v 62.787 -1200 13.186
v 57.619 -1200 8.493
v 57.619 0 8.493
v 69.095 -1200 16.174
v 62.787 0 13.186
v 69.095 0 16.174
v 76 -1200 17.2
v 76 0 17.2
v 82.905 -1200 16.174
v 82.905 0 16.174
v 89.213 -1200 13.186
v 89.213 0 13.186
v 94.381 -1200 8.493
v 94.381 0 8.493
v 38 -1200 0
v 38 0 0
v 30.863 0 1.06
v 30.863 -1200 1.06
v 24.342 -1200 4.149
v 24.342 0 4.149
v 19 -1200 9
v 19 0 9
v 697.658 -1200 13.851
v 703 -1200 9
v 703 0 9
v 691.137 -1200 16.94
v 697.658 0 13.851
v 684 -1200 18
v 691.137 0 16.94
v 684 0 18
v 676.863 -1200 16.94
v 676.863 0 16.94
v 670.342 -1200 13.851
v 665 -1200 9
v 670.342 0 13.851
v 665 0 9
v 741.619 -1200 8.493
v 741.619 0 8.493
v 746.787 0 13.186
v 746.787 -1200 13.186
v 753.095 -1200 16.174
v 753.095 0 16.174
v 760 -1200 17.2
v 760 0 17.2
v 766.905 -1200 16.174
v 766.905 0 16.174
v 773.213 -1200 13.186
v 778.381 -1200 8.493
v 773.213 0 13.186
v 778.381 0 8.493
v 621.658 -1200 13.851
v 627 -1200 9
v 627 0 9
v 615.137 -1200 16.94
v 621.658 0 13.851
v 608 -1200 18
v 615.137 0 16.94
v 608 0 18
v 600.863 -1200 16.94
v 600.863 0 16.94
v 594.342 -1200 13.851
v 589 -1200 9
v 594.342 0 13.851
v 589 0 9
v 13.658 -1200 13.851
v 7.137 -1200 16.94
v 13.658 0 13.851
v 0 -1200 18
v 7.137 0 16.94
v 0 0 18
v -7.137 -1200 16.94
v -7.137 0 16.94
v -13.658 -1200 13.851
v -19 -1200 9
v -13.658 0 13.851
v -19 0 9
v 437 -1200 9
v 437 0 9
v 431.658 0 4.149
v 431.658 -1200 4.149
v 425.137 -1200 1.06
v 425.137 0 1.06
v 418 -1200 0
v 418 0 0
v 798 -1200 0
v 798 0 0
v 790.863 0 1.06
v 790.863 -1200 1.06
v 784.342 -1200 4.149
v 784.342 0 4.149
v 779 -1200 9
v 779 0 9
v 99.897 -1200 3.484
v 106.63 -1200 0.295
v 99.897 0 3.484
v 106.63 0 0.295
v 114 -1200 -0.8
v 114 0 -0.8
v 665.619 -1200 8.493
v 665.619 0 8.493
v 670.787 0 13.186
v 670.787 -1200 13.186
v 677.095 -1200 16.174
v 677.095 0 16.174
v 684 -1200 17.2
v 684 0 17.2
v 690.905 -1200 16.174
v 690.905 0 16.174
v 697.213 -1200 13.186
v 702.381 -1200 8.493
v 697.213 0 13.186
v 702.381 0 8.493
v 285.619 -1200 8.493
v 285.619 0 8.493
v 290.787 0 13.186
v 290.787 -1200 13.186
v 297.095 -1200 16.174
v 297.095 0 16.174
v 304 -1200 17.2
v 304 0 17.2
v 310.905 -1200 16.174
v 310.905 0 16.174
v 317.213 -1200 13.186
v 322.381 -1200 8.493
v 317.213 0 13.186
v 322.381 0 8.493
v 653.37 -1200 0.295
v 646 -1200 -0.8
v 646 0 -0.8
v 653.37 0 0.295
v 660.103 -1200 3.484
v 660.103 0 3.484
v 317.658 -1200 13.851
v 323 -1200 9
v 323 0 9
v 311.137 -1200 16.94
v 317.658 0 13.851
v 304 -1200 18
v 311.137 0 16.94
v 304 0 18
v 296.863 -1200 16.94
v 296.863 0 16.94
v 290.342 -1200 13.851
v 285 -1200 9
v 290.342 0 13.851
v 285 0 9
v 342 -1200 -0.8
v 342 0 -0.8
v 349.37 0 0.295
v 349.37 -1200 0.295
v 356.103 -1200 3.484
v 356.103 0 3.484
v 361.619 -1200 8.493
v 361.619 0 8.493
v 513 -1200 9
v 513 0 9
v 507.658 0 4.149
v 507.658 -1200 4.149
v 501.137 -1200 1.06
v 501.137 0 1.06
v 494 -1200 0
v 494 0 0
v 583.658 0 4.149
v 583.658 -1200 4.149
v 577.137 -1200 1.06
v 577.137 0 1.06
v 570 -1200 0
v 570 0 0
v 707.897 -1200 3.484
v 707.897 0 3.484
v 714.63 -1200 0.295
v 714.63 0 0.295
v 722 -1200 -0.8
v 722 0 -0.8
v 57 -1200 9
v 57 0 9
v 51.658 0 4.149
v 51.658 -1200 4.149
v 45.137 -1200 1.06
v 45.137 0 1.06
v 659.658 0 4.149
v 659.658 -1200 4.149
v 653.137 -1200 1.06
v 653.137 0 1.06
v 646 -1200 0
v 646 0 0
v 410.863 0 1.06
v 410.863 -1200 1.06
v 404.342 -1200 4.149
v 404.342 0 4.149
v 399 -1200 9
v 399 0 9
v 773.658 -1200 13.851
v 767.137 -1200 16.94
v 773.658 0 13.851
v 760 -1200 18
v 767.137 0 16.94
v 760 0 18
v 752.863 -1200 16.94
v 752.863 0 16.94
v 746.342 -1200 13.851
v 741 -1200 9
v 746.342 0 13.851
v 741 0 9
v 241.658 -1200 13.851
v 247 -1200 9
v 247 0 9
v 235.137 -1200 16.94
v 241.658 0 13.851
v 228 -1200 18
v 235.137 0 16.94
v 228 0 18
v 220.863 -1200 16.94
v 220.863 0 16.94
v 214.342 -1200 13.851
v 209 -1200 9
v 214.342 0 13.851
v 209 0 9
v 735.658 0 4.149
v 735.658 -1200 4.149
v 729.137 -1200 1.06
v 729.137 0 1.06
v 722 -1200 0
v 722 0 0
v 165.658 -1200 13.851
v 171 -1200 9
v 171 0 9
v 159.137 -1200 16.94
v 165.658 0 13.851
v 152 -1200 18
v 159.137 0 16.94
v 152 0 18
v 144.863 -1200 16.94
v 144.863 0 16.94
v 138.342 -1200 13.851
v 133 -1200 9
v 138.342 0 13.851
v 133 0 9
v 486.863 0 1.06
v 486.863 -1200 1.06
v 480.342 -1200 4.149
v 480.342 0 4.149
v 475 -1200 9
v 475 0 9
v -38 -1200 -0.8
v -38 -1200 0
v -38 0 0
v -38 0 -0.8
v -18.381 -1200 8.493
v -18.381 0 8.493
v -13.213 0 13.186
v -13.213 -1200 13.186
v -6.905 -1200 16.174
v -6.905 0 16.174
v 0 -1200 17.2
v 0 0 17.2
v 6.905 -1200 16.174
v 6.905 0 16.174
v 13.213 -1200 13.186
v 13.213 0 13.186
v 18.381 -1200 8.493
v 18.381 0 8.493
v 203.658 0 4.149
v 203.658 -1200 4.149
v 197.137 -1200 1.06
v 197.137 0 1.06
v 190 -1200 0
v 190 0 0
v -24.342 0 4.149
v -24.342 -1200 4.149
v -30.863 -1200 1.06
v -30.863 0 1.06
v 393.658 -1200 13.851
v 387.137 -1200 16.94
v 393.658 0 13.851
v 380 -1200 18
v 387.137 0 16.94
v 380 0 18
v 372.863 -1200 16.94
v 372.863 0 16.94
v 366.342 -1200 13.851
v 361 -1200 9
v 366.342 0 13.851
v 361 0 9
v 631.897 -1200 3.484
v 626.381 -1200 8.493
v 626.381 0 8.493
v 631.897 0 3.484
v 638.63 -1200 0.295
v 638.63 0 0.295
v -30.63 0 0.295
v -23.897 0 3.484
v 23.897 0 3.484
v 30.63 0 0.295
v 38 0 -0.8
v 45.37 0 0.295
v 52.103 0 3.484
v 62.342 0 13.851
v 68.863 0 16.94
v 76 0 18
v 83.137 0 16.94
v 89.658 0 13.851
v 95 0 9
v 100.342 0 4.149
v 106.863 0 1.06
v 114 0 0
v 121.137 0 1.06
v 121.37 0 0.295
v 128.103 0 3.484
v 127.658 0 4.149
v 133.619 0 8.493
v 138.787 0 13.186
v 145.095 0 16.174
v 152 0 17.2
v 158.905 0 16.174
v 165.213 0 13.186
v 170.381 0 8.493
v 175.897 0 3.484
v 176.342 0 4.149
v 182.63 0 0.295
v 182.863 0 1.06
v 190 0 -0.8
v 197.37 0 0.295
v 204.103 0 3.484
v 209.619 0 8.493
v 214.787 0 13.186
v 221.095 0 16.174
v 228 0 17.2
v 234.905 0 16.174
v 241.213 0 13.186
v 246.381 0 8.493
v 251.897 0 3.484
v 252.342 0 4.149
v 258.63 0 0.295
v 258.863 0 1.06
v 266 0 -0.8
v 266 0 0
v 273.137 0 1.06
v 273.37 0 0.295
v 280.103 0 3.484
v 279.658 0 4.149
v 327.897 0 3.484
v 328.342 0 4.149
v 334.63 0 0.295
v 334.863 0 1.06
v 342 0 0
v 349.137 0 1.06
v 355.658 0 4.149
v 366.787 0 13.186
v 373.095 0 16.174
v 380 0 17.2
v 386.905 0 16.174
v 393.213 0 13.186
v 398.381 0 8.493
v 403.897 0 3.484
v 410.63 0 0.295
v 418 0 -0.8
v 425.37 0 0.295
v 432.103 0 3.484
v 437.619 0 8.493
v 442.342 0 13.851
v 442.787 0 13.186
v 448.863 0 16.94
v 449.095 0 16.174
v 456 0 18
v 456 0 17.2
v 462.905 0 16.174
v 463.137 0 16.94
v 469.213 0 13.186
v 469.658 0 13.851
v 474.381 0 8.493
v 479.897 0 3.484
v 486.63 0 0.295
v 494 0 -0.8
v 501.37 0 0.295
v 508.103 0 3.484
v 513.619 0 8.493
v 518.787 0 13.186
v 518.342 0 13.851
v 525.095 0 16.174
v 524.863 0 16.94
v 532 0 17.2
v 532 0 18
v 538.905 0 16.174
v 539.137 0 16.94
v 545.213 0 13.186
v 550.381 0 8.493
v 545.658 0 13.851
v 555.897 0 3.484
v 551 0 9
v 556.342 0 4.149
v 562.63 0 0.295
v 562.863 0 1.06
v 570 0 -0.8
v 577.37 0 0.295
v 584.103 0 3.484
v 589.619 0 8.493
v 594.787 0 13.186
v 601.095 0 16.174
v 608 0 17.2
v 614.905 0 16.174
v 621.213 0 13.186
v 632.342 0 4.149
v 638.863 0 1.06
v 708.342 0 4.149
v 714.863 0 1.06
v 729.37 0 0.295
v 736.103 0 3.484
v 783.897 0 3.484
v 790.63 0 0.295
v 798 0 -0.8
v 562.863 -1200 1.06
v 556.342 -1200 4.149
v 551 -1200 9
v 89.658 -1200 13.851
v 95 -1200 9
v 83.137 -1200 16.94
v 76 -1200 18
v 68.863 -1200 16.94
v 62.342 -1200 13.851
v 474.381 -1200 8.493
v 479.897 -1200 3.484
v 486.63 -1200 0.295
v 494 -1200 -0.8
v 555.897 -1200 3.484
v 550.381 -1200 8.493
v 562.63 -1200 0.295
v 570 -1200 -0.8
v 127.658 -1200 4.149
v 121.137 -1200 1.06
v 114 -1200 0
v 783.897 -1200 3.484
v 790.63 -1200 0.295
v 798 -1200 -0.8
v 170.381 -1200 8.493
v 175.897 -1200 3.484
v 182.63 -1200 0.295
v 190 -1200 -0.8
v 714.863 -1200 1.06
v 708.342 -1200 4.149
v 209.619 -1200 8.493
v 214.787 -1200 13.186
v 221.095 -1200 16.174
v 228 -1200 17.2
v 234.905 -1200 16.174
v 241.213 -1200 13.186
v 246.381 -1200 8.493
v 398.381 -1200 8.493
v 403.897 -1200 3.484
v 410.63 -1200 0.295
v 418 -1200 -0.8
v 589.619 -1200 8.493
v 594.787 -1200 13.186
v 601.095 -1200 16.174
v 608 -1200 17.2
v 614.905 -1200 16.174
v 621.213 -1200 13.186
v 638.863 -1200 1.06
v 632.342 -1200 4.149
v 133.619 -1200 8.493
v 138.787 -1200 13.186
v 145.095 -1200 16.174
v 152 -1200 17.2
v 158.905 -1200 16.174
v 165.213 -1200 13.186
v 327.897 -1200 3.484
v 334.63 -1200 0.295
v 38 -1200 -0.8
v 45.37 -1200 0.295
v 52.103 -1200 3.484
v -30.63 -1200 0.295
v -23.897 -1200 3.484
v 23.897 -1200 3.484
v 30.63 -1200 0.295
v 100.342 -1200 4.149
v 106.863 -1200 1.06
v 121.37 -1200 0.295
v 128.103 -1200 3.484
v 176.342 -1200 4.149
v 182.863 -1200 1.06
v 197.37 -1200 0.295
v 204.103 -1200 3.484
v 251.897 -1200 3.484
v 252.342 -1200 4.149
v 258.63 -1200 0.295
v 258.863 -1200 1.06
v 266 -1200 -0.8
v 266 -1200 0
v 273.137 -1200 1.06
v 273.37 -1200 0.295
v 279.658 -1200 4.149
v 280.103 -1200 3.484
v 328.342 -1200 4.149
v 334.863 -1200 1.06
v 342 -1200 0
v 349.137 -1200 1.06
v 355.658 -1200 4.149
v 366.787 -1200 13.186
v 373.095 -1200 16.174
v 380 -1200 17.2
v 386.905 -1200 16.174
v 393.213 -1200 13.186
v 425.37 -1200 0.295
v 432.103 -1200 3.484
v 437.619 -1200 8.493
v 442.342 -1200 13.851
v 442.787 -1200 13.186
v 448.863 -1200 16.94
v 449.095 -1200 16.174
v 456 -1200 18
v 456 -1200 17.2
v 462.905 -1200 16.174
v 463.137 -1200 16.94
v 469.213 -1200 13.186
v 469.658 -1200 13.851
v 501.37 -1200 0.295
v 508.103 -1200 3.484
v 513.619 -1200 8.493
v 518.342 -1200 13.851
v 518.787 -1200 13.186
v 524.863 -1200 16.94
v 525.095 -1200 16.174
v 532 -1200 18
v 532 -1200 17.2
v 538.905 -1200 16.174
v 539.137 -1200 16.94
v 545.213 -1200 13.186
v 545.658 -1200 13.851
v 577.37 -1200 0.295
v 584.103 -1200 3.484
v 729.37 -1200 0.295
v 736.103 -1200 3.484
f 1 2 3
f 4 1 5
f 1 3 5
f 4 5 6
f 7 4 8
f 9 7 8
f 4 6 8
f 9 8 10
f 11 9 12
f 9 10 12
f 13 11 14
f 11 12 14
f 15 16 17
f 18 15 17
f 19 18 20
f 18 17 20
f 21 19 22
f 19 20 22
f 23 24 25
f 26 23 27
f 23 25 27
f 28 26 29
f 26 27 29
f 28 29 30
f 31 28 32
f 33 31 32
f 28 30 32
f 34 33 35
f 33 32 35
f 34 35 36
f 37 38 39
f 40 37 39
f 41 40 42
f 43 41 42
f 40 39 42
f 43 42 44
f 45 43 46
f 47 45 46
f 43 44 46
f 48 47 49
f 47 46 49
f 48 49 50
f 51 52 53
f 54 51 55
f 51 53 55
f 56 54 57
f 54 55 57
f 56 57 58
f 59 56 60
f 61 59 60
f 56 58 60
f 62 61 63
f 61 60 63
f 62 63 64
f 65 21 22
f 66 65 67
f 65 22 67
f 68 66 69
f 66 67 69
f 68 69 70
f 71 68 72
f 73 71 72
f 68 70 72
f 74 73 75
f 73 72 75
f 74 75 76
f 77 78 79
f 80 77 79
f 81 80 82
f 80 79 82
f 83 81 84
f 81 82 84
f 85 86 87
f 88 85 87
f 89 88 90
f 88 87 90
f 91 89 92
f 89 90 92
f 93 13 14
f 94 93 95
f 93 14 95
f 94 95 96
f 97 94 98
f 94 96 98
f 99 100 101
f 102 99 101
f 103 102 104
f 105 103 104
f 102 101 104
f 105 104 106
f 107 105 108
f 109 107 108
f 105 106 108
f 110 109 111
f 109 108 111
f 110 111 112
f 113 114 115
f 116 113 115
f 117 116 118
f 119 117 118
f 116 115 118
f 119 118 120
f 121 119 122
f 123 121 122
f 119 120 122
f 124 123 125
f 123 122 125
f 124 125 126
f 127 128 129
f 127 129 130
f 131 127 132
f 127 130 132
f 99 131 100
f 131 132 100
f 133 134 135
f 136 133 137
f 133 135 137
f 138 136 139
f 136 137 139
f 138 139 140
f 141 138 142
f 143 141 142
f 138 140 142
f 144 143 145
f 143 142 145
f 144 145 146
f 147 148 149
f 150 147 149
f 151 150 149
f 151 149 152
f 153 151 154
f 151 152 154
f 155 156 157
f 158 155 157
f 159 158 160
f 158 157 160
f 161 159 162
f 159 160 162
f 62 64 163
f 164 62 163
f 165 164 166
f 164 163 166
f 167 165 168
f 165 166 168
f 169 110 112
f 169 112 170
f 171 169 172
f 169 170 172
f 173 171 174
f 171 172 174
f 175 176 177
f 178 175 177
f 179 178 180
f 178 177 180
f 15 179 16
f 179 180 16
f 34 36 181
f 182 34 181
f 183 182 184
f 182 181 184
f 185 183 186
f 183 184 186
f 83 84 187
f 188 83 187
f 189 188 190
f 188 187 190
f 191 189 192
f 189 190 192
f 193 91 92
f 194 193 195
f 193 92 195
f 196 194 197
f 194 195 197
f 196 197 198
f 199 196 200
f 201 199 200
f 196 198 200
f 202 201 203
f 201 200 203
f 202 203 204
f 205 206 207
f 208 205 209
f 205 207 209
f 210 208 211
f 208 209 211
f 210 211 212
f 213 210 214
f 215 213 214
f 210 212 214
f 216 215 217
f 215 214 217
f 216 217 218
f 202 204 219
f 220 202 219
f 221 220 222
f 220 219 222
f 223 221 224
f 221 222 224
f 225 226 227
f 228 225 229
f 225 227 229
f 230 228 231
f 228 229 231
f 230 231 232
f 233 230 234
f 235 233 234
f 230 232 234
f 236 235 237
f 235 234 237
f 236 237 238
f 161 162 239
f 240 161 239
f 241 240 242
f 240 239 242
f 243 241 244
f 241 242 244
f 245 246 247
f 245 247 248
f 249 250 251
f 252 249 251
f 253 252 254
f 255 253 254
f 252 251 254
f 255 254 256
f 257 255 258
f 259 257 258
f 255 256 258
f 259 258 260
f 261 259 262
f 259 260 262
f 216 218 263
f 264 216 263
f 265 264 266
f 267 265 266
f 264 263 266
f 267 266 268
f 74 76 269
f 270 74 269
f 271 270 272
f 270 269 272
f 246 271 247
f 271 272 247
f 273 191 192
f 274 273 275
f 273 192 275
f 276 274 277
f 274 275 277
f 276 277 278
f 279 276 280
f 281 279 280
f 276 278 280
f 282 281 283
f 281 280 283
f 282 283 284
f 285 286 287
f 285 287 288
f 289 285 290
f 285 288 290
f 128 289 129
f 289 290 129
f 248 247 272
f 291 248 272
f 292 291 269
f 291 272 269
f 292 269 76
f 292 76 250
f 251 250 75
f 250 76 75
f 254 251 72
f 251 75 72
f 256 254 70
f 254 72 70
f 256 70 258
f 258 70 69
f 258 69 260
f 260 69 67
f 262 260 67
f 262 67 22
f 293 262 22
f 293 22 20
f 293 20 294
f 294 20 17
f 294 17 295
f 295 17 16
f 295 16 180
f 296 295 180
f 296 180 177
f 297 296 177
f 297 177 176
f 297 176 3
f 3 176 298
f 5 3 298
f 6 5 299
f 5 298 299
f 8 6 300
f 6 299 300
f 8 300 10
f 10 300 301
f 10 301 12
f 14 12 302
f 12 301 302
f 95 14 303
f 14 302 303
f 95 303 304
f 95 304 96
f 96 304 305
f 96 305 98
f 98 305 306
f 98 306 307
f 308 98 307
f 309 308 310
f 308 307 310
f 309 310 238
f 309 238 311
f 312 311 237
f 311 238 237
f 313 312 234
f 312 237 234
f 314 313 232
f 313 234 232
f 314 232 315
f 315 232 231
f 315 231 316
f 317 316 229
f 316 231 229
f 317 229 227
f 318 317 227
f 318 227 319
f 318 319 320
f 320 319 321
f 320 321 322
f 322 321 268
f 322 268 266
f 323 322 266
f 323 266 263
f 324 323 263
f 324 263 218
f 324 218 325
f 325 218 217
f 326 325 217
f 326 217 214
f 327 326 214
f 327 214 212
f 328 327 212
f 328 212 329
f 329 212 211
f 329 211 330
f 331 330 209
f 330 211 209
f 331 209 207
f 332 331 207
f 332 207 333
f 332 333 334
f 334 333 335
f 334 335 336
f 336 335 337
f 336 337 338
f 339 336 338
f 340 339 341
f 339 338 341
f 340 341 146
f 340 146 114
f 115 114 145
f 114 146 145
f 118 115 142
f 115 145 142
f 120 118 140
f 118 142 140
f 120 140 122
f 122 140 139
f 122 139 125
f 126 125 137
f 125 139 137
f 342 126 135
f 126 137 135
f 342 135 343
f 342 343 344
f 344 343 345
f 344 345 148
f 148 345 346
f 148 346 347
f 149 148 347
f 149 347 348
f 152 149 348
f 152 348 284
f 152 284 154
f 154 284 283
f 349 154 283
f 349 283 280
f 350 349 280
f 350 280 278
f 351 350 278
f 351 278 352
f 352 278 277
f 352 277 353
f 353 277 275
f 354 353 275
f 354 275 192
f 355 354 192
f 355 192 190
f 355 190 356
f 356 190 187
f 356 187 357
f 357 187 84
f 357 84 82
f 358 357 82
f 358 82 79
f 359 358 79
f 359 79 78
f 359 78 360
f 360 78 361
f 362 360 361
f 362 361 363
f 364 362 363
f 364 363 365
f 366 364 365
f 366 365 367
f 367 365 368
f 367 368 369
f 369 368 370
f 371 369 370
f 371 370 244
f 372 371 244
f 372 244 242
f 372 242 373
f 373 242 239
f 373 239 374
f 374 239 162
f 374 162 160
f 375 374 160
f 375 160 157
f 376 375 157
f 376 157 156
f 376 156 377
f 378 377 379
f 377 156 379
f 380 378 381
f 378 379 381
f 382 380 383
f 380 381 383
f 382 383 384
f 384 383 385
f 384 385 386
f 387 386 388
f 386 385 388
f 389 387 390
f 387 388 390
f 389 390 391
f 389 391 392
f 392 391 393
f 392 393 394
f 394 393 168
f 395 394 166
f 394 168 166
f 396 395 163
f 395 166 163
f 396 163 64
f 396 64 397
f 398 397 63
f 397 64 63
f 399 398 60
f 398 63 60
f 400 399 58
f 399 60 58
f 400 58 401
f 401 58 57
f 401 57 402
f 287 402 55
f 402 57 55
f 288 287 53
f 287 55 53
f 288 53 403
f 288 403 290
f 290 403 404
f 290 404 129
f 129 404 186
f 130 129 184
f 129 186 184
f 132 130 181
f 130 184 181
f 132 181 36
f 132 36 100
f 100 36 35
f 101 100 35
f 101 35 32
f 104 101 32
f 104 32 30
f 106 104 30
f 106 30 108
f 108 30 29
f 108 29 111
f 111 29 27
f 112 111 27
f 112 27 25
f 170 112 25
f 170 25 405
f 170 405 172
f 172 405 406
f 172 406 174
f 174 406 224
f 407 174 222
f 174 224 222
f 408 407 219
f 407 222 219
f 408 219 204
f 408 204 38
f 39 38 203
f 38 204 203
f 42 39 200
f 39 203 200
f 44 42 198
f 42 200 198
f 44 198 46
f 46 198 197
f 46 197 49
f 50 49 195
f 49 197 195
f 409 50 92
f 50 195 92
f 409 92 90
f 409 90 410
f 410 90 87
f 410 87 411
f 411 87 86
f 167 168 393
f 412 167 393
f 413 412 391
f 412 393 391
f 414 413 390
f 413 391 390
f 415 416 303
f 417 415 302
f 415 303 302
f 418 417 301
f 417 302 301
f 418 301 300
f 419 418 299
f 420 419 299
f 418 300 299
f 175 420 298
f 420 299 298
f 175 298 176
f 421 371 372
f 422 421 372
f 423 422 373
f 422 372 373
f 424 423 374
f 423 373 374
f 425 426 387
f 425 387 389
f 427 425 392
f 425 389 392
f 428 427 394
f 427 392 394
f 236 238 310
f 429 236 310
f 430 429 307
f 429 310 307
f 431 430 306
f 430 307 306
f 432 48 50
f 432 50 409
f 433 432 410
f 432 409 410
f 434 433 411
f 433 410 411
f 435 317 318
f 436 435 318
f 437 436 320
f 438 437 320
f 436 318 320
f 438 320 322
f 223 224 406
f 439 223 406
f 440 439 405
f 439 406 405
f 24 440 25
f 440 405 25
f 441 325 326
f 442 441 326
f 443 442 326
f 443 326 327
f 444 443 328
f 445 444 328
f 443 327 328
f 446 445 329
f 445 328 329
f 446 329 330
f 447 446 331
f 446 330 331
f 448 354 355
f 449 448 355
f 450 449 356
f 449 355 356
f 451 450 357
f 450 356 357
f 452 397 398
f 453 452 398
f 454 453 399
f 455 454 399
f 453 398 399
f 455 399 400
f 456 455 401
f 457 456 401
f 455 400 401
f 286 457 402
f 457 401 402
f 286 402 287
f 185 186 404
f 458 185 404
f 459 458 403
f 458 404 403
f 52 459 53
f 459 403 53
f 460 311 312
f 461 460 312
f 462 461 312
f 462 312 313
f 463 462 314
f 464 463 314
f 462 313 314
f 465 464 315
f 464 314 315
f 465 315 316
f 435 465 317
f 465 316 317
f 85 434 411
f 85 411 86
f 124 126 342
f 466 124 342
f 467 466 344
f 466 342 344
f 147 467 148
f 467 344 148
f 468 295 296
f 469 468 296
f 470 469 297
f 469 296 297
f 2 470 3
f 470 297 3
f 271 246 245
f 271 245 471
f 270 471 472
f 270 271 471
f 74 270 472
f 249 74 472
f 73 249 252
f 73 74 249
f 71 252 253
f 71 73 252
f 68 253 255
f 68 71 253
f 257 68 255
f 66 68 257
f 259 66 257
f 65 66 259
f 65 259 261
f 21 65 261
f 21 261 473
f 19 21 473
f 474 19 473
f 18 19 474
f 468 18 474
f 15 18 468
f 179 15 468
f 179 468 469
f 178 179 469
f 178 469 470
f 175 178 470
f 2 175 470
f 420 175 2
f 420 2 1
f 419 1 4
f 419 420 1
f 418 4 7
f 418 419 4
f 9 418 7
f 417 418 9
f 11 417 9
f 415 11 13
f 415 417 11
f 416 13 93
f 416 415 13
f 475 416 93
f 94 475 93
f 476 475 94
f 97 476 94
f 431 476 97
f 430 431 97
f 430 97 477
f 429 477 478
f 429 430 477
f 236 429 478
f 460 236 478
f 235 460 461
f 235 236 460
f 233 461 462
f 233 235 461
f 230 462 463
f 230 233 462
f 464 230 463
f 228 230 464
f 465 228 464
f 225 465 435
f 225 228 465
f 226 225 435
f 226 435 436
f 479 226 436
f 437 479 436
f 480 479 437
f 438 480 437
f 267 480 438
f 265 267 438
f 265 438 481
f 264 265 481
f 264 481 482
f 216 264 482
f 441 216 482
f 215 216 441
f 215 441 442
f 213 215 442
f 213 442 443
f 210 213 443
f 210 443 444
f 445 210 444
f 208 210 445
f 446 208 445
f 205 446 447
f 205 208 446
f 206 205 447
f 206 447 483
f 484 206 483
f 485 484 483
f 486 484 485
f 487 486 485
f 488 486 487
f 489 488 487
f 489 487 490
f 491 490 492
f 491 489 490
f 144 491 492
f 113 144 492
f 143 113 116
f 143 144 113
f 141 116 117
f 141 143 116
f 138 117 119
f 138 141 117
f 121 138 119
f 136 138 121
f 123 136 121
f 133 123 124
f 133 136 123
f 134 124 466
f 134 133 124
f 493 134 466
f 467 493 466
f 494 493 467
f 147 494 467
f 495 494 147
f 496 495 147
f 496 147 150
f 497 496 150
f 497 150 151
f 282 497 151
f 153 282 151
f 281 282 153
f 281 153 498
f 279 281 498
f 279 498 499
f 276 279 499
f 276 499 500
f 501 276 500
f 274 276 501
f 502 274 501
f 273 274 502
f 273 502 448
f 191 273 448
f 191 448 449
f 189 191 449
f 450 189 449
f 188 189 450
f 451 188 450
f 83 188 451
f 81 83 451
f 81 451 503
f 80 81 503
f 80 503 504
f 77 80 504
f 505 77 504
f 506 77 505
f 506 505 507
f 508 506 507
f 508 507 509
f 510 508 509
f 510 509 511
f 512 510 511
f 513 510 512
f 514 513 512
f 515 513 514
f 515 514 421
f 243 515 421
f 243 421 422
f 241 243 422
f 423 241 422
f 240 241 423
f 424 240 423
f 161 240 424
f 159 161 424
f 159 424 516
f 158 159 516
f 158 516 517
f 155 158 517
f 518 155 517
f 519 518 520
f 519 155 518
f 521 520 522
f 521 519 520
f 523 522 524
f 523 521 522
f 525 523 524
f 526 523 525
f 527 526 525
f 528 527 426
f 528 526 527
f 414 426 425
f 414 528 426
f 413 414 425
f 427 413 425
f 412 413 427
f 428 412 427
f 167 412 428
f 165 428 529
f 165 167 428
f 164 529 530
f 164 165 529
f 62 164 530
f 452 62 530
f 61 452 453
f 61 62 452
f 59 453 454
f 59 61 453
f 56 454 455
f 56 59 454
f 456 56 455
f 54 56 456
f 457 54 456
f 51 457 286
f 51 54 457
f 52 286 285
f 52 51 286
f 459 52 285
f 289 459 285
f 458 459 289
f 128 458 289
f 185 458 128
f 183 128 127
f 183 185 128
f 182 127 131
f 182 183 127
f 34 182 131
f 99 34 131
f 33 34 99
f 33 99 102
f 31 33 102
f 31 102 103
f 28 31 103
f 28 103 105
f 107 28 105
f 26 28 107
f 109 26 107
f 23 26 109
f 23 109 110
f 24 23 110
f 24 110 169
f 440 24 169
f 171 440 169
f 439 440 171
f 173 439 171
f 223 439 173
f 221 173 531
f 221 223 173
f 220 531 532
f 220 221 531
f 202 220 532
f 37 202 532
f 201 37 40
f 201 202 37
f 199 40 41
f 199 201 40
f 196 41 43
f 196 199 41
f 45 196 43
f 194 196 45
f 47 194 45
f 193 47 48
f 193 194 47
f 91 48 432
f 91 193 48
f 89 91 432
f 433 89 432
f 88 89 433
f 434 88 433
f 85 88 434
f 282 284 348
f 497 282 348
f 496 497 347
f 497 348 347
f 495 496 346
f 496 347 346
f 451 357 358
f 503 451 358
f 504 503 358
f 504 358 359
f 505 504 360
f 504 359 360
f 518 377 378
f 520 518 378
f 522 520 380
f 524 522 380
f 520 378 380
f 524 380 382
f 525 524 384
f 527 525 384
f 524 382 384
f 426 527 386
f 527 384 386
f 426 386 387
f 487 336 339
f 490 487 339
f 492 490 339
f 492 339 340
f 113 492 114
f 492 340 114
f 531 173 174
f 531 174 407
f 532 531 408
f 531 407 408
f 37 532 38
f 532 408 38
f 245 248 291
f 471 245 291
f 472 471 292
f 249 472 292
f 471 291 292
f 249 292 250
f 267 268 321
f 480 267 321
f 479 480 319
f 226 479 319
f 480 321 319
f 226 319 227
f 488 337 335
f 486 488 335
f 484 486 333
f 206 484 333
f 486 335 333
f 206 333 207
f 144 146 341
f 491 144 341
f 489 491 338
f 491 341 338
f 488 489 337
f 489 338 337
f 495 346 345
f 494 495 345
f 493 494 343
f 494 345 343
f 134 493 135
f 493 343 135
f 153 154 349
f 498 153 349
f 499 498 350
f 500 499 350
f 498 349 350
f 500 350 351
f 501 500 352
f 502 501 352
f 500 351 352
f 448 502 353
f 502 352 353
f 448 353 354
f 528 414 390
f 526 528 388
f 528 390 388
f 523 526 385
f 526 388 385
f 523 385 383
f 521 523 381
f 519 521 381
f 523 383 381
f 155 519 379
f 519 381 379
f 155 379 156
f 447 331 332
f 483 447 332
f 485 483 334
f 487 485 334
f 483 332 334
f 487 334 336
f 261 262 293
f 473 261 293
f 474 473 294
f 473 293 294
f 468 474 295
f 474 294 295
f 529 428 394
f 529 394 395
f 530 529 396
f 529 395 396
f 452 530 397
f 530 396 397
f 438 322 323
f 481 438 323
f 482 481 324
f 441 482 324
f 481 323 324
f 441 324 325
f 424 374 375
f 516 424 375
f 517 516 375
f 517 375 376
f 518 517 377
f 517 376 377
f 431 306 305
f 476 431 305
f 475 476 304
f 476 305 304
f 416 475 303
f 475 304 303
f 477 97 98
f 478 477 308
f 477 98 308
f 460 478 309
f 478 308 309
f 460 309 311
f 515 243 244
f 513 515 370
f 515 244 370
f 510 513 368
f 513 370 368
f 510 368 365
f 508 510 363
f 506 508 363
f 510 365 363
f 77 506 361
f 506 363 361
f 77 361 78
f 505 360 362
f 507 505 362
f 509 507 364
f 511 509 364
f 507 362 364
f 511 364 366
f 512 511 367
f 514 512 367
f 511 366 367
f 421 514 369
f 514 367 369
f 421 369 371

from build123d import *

# Parameters (mm, degrees)
F1_DEPTH = 1200


with BuildPart() as f1:
    # F0 (on Front) → F1 (new body)
    with BuildSketch(Plane.XZ):
        with BuildLine():
            ThreePointArc((38, 0), (27.488102, 2.363771), (19, 9))
            ThreePointArc((19, 9), (0, 18), (-19, 9))
            ThreePointArc((-19, 9), (-27.488102, 2.363771), (-38, 0))
            Line((-38, 0), (-38, -0.8))
            ThreePointArc((-38, -0.8), (-27.145633, 1.640781), (-18.380995, 8.493213))
            ThreePointArc((-18.380995, 8.493213), (0, 17.2), (18.380995, 8.493213))
            ThreePointArc((18.380995, 8.493213), (27.145633, 1.640781), (38, -0.8))
            ThreePointArc((38, -0.8), (48.854367, 1.640781), (57.619005, 8.493213))
            ThreePointArc((57.619005, 8.493213), (76, 17.2), (94.380995, 8.493213))
            ThreePointArc((94.380995, 8.493213), (103.145633, 1.640781), (114, -0.8))
            ThreePointArc((114, -0.8), (124.854367, 1.640781), (133.619005, 8.493213))
            ThreePointArc((133.619005, 8.493213), (152, 17.2), (170.380995, 8.493213))
            ThreePointArc((170.380995, 8.493213), (179.145633, 1.640781), (190, -0.8))
            ThreePointArc((190, -0.8), (200.854367, 1.640781), (209.619005, 8.493213))
            ThreePointArc((209.619005, 8.493213), (228, 17.2), (246.380995, 8.493213))
            ThreePointArc((246.380995, 8.493213), (255.145633, 1.640781), (266, -0.8))
            ThreePointArc((266, -0.8), (276.854367, 1.640781), (285.619005, 8.493213))
            ThreePointArc((285.619005, 8.493213), (304, 17.2), (322.380995, 8.493213))
            ThreePointArc((322.380995, 8.493213), (331.145633, 1.640781), (342, -0.8))
            ThreePointArc((342, -0.8), (352.854367, 1.640781), (361.619005, 8.493213))
            ThreePointArc((361.619005, 8.493213), (380, 17.2), (398.380995, 8.493213))
            ThreePointArc((398.380995, 8.493213), (407.145633, 1.640781), (418, -0.8))
            ThreePointArc((418, -0.8), (428.854367, 1.640781), (437.619005, 8.493213))
            ThreePointArc((437.619005, 8.493213), (456, 17.2), (474.380995, 8.493213))
            ThreePointArc((474.380995, 8.493213), (483.145633, 1.640781), (494, -0.8))
            ThreePointArc((494, -0.8), (504.854367, 1.640781), (513.619005, 8.493213))
            ThreePointArc((513.619005, 8.493213), (532, 17.2), (550.380995, 8.493213))
            ThreePointArc((550.380995, 8.493213), (559.145633, 1.640781), (570, -0.8))
            ThreePointArc((570, -0.8), (580.854367, 1.640781), (589.619005, 8.493213))
            ThreePointArc((589.619005, 8.493213), (608, 17.2), (626.380995, 8.493213))
            ThreePointArc((626.380995, 8.493213), (635.145633, 1.640781), (646, -0.8))
            ThreePointArc((646, -0.8), (656.854367, 1.640781), (665.619005, 8.493213))
            ThreePointArc((665.619005, 8.493213), (684, 17.2), (702.380995, 8.493213))
            ThreePointArc((702.380995, 8.493213), (711.145633, 1.640781), (722, -0.8))
            ThreePointArc((722, -0.8), (732.854367, 1.640781), (741.619005, 8.493213))
            ThreePointArc((741.619005, 8.493213), (760, 17.2), (778.380995, 8.493213))
            ThreePointArc((778.380995, 8.493213), (787.145633, 1.640781), (798, -0.8))
            Line((798, -0.8), (798, 0))
            ThreePointArc((798, 0), (787.488102, 2.363771), (779, 9))
            ThreePointArc((779, 9), (760, 18), (741, 9))
            ThreePointArc((741, 9), (732.511898, 2.363771), (722, 0))
            ThreePointArc((722, 0), (711.488102, 2.363771), (703, 9))
            ThreePointArc((703, 9), (684, 18), (665, 9))
            ThreePointArc((665, 9), (656.511898, 2.363771), (646, 0))
            ThreePointArc((646, 0), (635.488102, 2.363771), (627, 9))
            ThreePointArc((627, 9), (608, 18), (589, 9))
            ThreePointArc((589, 9), (580.511898, 2.363771), (570, 0))
            ThreePointArc((570, 0), (559.488102, 2.363771), (551, 9))
            ThreePointArc((551, 9), (532, 18), (513, 9))
            ThreePointArc((513, 9), (504.511898, 2.363771), (494, 0))
            ThreePointArc((494, 0), (483.488102, 2.363771), (475, 9))
            ThreePointArc((475, 9), (456, 18), (437, 9))
            ThreePointArc((437, 9), (428.511898, 2.363771), (418, 0))
            ThreePointArc((418, 0), (407.488102, 2.363771), (399, 9))
            ThreePointArc((399, 9), (380, 18), (361, 9))
            ThreePointArc((361, 9), (352.511898, 2.363771), (342, 0))
            ThreePointArc((342, 0), (331.488102, 2.363771), (323, 9))
            ThreePointArc((323, 9), (304, 18), (285, 9))
            ThreePointArc((285, 9), (276.511898, 2.363771), (266, 0))
            ThreePointArc((266, 0), (255.488102, 2.363771), (247, 9))
            ThreePointArc((247, 9), (228, 18), (209, 9))
            ThreePointArc((209, 9), (200.511898, 2.363771), (190, 0))
            ThreePointArc((190, 0), (179.488102, 2.363771), (171, 9))
            ThreePointArc((171, 9), (152, 18), (133, 9))
            ThreePointArc((133, 9), (124.511898, 2.363771), (114, 0))
            ThreePointArc((114, 0), (103.488102, 2.363771), (95, 9))
            ThreePointArc((95, 9), (76, 18), (57, 9))
            ThreePointArc((57, 9), (48.511898, 2.363771), (38, 0))
        make_face()
    extrude(amount=F1_DEPTH)


solid = f1.part
